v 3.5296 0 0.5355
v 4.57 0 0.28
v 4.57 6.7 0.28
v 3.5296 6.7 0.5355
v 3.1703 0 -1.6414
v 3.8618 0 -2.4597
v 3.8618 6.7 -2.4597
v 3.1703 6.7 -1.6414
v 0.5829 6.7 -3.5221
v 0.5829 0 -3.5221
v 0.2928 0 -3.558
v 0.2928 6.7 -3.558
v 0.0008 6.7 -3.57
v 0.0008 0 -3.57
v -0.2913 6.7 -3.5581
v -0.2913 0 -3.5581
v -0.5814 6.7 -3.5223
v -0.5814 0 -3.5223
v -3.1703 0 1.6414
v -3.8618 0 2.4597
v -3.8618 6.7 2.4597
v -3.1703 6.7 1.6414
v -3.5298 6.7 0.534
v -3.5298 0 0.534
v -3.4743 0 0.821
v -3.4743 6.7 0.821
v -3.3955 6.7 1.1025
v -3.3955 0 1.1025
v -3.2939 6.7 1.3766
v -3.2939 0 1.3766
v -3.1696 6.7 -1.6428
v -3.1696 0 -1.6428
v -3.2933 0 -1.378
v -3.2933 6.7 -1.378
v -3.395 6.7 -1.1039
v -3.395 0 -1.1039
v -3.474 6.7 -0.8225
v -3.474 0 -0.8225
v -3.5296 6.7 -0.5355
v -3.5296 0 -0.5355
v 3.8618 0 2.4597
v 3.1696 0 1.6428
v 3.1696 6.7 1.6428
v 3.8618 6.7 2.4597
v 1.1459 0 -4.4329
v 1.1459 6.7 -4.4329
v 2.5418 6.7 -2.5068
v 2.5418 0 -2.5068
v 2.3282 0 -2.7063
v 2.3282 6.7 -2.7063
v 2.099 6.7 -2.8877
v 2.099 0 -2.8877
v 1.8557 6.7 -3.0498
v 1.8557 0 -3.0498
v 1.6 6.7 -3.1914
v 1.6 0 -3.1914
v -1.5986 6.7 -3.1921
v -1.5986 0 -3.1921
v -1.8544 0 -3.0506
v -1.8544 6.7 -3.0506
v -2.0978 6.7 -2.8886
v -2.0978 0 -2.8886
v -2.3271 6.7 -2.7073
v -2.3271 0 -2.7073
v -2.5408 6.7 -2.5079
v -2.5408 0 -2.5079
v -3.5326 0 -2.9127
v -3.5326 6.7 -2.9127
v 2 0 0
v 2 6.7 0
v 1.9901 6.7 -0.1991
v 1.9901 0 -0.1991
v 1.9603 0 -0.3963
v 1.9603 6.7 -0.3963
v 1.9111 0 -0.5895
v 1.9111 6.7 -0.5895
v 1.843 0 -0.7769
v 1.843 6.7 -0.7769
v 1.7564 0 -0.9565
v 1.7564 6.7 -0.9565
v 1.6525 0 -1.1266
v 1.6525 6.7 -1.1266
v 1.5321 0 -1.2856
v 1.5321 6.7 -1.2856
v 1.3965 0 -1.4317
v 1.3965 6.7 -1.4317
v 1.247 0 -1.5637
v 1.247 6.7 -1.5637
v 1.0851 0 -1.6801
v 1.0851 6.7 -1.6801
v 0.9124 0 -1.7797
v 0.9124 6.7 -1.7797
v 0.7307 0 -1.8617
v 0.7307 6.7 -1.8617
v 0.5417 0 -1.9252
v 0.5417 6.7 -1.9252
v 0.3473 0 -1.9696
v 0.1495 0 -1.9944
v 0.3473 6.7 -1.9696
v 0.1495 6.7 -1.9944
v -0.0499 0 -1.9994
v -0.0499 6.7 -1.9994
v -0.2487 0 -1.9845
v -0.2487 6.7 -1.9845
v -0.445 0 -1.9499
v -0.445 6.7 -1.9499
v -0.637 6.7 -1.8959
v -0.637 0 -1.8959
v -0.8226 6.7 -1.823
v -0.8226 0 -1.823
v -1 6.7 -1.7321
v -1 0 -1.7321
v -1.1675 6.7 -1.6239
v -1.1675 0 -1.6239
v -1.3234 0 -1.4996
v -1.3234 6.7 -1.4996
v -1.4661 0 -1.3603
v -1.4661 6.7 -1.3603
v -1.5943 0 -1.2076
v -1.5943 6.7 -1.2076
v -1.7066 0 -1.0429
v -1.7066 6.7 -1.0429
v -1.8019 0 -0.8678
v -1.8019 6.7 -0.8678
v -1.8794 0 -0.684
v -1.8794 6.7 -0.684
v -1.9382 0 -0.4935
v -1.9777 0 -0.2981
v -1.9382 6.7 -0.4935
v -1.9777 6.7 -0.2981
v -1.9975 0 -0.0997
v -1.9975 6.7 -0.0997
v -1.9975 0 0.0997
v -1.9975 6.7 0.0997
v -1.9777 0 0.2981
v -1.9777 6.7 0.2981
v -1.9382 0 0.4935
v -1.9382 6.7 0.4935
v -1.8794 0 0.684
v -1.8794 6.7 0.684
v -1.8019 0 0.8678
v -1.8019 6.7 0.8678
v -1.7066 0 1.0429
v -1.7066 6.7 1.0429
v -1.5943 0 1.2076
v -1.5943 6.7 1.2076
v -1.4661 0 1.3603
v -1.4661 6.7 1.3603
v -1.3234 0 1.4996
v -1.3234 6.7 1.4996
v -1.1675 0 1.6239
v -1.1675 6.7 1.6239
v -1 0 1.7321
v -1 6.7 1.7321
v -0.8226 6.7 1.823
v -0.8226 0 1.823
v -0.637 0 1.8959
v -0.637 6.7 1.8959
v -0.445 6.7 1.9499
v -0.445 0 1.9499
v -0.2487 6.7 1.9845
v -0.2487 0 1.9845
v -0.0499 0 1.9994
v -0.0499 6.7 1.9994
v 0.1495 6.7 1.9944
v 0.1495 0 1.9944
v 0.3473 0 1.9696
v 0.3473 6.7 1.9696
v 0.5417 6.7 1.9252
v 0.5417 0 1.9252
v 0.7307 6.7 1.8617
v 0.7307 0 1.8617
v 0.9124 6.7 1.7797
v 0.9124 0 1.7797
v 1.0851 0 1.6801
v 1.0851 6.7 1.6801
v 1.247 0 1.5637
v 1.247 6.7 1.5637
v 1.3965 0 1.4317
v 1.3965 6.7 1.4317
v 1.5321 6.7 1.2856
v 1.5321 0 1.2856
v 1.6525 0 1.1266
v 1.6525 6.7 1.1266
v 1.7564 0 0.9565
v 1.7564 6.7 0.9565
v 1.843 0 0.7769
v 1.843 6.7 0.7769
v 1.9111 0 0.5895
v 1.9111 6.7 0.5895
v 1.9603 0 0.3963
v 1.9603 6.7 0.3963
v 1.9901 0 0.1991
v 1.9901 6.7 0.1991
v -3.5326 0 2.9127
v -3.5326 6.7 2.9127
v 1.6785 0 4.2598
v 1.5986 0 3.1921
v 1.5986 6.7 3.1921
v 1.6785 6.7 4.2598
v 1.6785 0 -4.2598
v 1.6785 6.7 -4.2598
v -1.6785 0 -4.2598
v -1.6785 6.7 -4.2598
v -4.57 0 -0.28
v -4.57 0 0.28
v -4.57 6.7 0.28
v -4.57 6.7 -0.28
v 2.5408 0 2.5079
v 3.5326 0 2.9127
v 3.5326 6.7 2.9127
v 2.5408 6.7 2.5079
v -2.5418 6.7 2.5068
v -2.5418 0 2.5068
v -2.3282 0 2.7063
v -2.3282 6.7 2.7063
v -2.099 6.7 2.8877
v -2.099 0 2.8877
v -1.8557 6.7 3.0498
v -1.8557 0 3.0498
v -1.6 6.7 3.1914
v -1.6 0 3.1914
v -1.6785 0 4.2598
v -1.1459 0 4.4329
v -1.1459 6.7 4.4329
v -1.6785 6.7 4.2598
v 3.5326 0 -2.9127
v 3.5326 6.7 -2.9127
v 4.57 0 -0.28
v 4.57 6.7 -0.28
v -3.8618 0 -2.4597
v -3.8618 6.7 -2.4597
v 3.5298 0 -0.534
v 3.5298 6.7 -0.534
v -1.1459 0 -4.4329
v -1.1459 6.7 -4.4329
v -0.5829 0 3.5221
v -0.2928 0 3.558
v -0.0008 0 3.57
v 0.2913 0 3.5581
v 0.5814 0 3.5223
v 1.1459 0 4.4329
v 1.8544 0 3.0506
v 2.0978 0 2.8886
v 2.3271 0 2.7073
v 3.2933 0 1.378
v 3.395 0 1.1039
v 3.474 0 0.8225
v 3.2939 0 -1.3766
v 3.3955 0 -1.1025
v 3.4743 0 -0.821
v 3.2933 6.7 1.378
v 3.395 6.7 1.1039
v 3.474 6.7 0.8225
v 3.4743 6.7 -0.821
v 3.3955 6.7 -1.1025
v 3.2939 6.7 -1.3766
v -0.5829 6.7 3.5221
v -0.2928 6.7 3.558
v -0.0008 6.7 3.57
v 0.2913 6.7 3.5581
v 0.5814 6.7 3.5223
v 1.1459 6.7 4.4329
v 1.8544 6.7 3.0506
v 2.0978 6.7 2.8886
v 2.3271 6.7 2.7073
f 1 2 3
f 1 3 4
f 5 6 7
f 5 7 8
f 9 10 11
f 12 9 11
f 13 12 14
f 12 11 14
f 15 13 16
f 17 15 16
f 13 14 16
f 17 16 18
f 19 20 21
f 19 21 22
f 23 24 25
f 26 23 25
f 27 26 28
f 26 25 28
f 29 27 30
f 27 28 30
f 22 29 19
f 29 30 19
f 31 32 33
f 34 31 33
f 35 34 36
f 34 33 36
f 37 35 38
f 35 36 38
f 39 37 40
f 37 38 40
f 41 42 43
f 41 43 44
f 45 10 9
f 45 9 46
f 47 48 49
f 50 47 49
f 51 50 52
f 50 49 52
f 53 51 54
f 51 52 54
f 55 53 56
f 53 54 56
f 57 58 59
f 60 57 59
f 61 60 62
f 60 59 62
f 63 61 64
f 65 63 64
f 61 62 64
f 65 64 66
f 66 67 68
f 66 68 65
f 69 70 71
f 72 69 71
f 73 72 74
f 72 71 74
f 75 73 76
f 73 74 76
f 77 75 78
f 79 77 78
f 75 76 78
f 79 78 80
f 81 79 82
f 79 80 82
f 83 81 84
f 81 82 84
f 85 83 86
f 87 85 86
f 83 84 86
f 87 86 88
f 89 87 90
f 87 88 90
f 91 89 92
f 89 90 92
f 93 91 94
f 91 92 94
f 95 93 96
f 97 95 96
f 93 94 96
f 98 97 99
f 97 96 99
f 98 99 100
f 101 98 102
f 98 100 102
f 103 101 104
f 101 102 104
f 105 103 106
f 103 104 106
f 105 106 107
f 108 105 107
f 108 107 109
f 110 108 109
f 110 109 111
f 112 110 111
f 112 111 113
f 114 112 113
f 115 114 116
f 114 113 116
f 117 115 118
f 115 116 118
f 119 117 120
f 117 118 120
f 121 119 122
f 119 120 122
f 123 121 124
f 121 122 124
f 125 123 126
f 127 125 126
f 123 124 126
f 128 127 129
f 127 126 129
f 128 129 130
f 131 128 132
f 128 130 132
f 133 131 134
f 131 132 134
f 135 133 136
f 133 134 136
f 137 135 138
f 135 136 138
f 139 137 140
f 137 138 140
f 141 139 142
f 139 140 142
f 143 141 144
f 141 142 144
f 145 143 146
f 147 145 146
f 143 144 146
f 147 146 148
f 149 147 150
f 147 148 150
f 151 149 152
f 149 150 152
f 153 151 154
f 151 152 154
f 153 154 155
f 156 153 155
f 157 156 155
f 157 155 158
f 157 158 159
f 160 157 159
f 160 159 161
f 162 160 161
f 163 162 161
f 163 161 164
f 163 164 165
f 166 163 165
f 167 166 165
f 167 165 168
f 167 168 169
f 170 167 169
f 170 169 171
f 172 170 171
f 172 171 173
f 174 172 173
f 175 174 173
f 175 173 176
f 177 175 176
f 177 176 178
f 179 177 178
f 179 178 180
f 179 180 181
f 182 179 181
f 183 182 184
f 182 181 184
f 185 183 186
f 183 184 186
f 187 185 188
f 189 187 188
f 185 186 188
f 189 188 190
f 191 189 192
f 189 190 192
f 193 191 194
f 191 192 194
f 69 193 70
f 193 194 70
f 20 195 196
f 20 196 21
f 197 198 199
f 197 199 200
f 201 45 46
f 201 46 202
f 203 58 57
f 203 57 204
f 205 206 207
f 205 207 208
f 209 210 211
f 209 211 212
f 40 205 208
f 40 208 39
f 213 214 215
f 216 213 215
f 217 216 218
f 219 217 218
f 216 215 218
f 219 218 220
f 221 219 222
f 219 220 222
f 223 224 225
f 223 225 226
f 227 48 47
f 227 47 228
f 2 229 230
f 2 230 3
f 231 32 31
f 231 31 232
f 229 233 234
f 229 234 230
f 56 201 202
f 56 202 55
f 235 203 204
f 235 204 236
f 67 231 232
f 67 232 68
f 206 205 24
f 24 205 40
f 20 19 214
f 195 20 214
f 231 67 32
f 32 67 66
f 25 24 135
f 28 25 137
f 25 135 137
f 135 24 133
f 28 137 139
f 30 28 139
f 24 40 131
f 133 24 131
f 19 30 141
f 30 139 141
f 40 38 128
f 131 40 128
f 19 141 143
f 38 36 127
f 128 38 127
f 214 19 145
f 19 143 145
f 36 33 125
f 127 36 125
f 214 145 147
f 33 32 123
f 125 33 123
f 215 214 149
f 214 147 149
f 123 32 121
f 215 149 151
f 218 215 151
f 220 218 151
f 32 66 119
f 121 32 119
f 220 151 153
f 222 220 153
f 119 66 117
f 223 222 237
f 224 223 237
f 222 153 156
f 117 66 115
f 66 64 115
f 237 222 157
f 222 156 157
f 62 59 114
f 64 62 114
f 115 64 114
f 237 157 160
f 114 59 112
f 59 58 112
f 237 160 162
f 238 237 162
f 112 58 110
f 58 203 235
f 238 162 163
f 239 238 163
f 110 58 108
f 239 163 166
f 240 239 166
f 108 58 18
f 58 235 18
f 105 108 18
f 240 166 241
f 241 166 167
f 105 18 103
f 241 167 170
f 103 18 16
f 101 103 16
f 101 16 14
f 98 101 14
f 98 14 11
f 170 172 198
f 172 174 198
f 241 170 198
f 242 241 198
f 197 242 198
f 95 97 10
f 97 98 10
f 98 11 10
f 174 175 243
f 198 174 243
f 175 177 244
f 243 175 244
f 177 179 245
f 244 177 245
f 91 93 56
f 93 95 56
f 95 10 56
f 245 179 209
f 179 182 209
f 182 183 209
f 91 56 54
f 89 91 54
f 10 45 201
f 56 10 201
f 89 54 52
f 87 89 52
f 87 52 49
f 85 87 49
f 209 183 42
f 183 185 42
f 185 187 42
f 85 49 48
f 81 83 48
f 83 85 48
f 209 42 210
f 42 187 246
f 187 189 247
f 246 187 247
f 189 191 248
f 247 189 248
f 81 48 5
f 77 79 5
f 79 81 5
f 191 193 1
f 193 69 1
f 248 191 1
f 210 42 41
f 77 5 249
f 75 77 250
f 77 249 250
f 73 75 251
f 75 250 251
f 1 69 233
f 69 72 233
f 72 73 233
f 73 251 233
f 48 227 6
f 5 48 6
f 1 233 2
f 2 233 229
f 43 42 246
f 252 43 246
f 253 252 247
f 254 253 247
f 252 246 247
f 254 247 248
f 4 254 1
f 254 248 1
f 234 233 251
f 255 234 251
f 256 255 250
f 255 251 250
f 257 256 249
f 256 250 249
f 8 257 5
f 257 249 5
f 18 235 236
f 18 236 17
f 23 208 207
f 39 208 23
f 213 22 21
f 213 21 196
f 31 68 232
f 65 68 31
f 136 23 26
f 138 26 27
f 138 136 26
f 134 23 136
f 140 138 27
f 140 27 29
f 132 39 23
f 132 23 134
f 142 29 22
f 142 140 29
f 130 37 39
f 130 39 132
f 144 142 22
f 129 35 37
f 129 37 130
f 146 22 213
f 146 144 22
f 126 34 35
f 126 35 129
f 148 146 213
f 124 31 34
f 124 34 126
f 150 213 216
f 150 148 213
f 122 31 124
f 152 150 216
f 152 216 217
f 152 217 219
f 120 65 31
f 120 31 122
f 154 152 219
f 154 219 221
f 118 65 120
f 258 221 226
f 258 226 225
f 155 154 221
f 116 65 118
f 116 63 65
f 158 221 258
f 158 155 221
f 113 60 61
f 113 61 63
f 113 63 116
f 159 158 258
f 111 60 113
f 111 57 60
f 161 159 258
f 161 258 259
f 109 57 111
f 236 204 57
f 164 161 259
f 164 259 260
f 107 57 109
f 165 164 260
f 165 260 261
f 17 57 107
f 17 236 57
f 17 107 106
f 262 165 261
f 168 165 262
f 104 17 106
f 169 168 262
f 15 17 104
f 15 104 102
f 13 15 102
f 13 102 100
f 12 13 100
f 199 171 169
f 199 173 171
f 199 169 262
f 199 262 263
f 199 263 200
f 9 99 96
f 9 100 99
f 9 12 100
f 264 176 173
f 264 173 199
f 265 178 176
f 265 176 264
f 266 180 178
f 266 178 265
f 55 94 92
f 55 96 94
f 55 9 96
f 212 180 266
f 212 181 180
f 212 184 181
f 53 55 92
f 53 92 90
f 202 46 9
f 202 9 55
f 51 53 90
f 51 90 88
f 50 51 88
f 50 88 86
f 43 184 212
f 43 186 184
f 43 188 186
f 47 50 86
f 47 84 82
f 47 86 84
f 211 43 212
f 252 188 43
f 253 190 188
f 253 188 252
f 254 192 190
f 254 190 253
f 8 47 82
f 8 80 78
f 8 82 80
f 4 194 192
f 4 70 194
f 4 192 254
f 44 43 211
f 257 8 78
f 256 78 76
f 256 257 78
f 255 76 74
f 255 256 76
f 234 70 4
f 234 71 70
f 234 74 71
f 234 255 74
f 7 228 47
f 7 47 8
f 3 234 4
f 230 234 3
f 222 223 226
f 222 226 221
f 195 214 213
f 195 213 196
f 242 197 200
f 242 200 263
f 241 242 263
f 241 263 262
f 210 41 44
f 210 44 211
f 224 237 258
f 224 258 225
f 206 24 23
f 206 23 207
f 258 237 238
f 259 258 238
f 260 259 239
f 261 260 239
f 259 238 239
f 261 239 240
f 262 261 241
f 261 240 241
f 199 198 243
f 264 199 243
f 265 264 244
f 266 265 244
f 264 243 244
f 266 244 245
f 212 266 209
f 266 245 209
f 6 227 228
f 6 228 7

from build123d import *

# Parameters (mm, degrees)
SKETCH1_R           = 3.57
BOSS_EXTRUDE1_DEPTH = 6.7
CIRPATTERN1_COUNT   = 10
SKETCH2_R           = 2
CUT_EXTRUDE1_DEPTH  = 6.7


with BuildPart() as part:
    # Sketch1 → Boss-Extrude1 (new body)
    with BuildSketch(Plane(origin=(0, 0, 0), x_dir=(1, 0, 0), z_dir=(0, 1, 0))):
        Circle(SKETCH1_R)
        with BuildLine():
            Line((4.57, 0), (4.57, -0.28))
            Line((4.57, -0.28), (3.265257749, -0.600409723))
            ThreePointArc((3.265257749, -0.600409723), (3.319999856, -0.000976281), (3.265610298, 0.598489252))
            Line((3.265610298, 0.598489252), (4.57, 0.28))
            Line((4.57, 0.28), (4.57, 0))
        make_face()
    boss_extrude1 = extrude(amount=BOSS_EXTRUDE1_DEPTH)

    # CirPattern1: Boss-Extrude1 ×10 about axis
    cirpattern1_axis = Axis((0, 0, 0), (0, 1, 0))
    for i in range(1, CIRPATTERN1_COUNT):
        add(boss_extrude1.rotate(cirpattern1_axis, i * 360 / CIRPATTERN1_COUNT))

    # Sketch2 → Cut-Extrude1 (cut)
    with BuildSketch(Plane(origin=(0, 6.7, 0), x_dir=(1, 0, 0), z_dir=(0, 1, 0))):
        Circle(SKETCH2_R)
    extrude(amount=-CUT_EXTRUDE1_DEPTH, mode=Mode.SUBTRACT)


solid = part.part
